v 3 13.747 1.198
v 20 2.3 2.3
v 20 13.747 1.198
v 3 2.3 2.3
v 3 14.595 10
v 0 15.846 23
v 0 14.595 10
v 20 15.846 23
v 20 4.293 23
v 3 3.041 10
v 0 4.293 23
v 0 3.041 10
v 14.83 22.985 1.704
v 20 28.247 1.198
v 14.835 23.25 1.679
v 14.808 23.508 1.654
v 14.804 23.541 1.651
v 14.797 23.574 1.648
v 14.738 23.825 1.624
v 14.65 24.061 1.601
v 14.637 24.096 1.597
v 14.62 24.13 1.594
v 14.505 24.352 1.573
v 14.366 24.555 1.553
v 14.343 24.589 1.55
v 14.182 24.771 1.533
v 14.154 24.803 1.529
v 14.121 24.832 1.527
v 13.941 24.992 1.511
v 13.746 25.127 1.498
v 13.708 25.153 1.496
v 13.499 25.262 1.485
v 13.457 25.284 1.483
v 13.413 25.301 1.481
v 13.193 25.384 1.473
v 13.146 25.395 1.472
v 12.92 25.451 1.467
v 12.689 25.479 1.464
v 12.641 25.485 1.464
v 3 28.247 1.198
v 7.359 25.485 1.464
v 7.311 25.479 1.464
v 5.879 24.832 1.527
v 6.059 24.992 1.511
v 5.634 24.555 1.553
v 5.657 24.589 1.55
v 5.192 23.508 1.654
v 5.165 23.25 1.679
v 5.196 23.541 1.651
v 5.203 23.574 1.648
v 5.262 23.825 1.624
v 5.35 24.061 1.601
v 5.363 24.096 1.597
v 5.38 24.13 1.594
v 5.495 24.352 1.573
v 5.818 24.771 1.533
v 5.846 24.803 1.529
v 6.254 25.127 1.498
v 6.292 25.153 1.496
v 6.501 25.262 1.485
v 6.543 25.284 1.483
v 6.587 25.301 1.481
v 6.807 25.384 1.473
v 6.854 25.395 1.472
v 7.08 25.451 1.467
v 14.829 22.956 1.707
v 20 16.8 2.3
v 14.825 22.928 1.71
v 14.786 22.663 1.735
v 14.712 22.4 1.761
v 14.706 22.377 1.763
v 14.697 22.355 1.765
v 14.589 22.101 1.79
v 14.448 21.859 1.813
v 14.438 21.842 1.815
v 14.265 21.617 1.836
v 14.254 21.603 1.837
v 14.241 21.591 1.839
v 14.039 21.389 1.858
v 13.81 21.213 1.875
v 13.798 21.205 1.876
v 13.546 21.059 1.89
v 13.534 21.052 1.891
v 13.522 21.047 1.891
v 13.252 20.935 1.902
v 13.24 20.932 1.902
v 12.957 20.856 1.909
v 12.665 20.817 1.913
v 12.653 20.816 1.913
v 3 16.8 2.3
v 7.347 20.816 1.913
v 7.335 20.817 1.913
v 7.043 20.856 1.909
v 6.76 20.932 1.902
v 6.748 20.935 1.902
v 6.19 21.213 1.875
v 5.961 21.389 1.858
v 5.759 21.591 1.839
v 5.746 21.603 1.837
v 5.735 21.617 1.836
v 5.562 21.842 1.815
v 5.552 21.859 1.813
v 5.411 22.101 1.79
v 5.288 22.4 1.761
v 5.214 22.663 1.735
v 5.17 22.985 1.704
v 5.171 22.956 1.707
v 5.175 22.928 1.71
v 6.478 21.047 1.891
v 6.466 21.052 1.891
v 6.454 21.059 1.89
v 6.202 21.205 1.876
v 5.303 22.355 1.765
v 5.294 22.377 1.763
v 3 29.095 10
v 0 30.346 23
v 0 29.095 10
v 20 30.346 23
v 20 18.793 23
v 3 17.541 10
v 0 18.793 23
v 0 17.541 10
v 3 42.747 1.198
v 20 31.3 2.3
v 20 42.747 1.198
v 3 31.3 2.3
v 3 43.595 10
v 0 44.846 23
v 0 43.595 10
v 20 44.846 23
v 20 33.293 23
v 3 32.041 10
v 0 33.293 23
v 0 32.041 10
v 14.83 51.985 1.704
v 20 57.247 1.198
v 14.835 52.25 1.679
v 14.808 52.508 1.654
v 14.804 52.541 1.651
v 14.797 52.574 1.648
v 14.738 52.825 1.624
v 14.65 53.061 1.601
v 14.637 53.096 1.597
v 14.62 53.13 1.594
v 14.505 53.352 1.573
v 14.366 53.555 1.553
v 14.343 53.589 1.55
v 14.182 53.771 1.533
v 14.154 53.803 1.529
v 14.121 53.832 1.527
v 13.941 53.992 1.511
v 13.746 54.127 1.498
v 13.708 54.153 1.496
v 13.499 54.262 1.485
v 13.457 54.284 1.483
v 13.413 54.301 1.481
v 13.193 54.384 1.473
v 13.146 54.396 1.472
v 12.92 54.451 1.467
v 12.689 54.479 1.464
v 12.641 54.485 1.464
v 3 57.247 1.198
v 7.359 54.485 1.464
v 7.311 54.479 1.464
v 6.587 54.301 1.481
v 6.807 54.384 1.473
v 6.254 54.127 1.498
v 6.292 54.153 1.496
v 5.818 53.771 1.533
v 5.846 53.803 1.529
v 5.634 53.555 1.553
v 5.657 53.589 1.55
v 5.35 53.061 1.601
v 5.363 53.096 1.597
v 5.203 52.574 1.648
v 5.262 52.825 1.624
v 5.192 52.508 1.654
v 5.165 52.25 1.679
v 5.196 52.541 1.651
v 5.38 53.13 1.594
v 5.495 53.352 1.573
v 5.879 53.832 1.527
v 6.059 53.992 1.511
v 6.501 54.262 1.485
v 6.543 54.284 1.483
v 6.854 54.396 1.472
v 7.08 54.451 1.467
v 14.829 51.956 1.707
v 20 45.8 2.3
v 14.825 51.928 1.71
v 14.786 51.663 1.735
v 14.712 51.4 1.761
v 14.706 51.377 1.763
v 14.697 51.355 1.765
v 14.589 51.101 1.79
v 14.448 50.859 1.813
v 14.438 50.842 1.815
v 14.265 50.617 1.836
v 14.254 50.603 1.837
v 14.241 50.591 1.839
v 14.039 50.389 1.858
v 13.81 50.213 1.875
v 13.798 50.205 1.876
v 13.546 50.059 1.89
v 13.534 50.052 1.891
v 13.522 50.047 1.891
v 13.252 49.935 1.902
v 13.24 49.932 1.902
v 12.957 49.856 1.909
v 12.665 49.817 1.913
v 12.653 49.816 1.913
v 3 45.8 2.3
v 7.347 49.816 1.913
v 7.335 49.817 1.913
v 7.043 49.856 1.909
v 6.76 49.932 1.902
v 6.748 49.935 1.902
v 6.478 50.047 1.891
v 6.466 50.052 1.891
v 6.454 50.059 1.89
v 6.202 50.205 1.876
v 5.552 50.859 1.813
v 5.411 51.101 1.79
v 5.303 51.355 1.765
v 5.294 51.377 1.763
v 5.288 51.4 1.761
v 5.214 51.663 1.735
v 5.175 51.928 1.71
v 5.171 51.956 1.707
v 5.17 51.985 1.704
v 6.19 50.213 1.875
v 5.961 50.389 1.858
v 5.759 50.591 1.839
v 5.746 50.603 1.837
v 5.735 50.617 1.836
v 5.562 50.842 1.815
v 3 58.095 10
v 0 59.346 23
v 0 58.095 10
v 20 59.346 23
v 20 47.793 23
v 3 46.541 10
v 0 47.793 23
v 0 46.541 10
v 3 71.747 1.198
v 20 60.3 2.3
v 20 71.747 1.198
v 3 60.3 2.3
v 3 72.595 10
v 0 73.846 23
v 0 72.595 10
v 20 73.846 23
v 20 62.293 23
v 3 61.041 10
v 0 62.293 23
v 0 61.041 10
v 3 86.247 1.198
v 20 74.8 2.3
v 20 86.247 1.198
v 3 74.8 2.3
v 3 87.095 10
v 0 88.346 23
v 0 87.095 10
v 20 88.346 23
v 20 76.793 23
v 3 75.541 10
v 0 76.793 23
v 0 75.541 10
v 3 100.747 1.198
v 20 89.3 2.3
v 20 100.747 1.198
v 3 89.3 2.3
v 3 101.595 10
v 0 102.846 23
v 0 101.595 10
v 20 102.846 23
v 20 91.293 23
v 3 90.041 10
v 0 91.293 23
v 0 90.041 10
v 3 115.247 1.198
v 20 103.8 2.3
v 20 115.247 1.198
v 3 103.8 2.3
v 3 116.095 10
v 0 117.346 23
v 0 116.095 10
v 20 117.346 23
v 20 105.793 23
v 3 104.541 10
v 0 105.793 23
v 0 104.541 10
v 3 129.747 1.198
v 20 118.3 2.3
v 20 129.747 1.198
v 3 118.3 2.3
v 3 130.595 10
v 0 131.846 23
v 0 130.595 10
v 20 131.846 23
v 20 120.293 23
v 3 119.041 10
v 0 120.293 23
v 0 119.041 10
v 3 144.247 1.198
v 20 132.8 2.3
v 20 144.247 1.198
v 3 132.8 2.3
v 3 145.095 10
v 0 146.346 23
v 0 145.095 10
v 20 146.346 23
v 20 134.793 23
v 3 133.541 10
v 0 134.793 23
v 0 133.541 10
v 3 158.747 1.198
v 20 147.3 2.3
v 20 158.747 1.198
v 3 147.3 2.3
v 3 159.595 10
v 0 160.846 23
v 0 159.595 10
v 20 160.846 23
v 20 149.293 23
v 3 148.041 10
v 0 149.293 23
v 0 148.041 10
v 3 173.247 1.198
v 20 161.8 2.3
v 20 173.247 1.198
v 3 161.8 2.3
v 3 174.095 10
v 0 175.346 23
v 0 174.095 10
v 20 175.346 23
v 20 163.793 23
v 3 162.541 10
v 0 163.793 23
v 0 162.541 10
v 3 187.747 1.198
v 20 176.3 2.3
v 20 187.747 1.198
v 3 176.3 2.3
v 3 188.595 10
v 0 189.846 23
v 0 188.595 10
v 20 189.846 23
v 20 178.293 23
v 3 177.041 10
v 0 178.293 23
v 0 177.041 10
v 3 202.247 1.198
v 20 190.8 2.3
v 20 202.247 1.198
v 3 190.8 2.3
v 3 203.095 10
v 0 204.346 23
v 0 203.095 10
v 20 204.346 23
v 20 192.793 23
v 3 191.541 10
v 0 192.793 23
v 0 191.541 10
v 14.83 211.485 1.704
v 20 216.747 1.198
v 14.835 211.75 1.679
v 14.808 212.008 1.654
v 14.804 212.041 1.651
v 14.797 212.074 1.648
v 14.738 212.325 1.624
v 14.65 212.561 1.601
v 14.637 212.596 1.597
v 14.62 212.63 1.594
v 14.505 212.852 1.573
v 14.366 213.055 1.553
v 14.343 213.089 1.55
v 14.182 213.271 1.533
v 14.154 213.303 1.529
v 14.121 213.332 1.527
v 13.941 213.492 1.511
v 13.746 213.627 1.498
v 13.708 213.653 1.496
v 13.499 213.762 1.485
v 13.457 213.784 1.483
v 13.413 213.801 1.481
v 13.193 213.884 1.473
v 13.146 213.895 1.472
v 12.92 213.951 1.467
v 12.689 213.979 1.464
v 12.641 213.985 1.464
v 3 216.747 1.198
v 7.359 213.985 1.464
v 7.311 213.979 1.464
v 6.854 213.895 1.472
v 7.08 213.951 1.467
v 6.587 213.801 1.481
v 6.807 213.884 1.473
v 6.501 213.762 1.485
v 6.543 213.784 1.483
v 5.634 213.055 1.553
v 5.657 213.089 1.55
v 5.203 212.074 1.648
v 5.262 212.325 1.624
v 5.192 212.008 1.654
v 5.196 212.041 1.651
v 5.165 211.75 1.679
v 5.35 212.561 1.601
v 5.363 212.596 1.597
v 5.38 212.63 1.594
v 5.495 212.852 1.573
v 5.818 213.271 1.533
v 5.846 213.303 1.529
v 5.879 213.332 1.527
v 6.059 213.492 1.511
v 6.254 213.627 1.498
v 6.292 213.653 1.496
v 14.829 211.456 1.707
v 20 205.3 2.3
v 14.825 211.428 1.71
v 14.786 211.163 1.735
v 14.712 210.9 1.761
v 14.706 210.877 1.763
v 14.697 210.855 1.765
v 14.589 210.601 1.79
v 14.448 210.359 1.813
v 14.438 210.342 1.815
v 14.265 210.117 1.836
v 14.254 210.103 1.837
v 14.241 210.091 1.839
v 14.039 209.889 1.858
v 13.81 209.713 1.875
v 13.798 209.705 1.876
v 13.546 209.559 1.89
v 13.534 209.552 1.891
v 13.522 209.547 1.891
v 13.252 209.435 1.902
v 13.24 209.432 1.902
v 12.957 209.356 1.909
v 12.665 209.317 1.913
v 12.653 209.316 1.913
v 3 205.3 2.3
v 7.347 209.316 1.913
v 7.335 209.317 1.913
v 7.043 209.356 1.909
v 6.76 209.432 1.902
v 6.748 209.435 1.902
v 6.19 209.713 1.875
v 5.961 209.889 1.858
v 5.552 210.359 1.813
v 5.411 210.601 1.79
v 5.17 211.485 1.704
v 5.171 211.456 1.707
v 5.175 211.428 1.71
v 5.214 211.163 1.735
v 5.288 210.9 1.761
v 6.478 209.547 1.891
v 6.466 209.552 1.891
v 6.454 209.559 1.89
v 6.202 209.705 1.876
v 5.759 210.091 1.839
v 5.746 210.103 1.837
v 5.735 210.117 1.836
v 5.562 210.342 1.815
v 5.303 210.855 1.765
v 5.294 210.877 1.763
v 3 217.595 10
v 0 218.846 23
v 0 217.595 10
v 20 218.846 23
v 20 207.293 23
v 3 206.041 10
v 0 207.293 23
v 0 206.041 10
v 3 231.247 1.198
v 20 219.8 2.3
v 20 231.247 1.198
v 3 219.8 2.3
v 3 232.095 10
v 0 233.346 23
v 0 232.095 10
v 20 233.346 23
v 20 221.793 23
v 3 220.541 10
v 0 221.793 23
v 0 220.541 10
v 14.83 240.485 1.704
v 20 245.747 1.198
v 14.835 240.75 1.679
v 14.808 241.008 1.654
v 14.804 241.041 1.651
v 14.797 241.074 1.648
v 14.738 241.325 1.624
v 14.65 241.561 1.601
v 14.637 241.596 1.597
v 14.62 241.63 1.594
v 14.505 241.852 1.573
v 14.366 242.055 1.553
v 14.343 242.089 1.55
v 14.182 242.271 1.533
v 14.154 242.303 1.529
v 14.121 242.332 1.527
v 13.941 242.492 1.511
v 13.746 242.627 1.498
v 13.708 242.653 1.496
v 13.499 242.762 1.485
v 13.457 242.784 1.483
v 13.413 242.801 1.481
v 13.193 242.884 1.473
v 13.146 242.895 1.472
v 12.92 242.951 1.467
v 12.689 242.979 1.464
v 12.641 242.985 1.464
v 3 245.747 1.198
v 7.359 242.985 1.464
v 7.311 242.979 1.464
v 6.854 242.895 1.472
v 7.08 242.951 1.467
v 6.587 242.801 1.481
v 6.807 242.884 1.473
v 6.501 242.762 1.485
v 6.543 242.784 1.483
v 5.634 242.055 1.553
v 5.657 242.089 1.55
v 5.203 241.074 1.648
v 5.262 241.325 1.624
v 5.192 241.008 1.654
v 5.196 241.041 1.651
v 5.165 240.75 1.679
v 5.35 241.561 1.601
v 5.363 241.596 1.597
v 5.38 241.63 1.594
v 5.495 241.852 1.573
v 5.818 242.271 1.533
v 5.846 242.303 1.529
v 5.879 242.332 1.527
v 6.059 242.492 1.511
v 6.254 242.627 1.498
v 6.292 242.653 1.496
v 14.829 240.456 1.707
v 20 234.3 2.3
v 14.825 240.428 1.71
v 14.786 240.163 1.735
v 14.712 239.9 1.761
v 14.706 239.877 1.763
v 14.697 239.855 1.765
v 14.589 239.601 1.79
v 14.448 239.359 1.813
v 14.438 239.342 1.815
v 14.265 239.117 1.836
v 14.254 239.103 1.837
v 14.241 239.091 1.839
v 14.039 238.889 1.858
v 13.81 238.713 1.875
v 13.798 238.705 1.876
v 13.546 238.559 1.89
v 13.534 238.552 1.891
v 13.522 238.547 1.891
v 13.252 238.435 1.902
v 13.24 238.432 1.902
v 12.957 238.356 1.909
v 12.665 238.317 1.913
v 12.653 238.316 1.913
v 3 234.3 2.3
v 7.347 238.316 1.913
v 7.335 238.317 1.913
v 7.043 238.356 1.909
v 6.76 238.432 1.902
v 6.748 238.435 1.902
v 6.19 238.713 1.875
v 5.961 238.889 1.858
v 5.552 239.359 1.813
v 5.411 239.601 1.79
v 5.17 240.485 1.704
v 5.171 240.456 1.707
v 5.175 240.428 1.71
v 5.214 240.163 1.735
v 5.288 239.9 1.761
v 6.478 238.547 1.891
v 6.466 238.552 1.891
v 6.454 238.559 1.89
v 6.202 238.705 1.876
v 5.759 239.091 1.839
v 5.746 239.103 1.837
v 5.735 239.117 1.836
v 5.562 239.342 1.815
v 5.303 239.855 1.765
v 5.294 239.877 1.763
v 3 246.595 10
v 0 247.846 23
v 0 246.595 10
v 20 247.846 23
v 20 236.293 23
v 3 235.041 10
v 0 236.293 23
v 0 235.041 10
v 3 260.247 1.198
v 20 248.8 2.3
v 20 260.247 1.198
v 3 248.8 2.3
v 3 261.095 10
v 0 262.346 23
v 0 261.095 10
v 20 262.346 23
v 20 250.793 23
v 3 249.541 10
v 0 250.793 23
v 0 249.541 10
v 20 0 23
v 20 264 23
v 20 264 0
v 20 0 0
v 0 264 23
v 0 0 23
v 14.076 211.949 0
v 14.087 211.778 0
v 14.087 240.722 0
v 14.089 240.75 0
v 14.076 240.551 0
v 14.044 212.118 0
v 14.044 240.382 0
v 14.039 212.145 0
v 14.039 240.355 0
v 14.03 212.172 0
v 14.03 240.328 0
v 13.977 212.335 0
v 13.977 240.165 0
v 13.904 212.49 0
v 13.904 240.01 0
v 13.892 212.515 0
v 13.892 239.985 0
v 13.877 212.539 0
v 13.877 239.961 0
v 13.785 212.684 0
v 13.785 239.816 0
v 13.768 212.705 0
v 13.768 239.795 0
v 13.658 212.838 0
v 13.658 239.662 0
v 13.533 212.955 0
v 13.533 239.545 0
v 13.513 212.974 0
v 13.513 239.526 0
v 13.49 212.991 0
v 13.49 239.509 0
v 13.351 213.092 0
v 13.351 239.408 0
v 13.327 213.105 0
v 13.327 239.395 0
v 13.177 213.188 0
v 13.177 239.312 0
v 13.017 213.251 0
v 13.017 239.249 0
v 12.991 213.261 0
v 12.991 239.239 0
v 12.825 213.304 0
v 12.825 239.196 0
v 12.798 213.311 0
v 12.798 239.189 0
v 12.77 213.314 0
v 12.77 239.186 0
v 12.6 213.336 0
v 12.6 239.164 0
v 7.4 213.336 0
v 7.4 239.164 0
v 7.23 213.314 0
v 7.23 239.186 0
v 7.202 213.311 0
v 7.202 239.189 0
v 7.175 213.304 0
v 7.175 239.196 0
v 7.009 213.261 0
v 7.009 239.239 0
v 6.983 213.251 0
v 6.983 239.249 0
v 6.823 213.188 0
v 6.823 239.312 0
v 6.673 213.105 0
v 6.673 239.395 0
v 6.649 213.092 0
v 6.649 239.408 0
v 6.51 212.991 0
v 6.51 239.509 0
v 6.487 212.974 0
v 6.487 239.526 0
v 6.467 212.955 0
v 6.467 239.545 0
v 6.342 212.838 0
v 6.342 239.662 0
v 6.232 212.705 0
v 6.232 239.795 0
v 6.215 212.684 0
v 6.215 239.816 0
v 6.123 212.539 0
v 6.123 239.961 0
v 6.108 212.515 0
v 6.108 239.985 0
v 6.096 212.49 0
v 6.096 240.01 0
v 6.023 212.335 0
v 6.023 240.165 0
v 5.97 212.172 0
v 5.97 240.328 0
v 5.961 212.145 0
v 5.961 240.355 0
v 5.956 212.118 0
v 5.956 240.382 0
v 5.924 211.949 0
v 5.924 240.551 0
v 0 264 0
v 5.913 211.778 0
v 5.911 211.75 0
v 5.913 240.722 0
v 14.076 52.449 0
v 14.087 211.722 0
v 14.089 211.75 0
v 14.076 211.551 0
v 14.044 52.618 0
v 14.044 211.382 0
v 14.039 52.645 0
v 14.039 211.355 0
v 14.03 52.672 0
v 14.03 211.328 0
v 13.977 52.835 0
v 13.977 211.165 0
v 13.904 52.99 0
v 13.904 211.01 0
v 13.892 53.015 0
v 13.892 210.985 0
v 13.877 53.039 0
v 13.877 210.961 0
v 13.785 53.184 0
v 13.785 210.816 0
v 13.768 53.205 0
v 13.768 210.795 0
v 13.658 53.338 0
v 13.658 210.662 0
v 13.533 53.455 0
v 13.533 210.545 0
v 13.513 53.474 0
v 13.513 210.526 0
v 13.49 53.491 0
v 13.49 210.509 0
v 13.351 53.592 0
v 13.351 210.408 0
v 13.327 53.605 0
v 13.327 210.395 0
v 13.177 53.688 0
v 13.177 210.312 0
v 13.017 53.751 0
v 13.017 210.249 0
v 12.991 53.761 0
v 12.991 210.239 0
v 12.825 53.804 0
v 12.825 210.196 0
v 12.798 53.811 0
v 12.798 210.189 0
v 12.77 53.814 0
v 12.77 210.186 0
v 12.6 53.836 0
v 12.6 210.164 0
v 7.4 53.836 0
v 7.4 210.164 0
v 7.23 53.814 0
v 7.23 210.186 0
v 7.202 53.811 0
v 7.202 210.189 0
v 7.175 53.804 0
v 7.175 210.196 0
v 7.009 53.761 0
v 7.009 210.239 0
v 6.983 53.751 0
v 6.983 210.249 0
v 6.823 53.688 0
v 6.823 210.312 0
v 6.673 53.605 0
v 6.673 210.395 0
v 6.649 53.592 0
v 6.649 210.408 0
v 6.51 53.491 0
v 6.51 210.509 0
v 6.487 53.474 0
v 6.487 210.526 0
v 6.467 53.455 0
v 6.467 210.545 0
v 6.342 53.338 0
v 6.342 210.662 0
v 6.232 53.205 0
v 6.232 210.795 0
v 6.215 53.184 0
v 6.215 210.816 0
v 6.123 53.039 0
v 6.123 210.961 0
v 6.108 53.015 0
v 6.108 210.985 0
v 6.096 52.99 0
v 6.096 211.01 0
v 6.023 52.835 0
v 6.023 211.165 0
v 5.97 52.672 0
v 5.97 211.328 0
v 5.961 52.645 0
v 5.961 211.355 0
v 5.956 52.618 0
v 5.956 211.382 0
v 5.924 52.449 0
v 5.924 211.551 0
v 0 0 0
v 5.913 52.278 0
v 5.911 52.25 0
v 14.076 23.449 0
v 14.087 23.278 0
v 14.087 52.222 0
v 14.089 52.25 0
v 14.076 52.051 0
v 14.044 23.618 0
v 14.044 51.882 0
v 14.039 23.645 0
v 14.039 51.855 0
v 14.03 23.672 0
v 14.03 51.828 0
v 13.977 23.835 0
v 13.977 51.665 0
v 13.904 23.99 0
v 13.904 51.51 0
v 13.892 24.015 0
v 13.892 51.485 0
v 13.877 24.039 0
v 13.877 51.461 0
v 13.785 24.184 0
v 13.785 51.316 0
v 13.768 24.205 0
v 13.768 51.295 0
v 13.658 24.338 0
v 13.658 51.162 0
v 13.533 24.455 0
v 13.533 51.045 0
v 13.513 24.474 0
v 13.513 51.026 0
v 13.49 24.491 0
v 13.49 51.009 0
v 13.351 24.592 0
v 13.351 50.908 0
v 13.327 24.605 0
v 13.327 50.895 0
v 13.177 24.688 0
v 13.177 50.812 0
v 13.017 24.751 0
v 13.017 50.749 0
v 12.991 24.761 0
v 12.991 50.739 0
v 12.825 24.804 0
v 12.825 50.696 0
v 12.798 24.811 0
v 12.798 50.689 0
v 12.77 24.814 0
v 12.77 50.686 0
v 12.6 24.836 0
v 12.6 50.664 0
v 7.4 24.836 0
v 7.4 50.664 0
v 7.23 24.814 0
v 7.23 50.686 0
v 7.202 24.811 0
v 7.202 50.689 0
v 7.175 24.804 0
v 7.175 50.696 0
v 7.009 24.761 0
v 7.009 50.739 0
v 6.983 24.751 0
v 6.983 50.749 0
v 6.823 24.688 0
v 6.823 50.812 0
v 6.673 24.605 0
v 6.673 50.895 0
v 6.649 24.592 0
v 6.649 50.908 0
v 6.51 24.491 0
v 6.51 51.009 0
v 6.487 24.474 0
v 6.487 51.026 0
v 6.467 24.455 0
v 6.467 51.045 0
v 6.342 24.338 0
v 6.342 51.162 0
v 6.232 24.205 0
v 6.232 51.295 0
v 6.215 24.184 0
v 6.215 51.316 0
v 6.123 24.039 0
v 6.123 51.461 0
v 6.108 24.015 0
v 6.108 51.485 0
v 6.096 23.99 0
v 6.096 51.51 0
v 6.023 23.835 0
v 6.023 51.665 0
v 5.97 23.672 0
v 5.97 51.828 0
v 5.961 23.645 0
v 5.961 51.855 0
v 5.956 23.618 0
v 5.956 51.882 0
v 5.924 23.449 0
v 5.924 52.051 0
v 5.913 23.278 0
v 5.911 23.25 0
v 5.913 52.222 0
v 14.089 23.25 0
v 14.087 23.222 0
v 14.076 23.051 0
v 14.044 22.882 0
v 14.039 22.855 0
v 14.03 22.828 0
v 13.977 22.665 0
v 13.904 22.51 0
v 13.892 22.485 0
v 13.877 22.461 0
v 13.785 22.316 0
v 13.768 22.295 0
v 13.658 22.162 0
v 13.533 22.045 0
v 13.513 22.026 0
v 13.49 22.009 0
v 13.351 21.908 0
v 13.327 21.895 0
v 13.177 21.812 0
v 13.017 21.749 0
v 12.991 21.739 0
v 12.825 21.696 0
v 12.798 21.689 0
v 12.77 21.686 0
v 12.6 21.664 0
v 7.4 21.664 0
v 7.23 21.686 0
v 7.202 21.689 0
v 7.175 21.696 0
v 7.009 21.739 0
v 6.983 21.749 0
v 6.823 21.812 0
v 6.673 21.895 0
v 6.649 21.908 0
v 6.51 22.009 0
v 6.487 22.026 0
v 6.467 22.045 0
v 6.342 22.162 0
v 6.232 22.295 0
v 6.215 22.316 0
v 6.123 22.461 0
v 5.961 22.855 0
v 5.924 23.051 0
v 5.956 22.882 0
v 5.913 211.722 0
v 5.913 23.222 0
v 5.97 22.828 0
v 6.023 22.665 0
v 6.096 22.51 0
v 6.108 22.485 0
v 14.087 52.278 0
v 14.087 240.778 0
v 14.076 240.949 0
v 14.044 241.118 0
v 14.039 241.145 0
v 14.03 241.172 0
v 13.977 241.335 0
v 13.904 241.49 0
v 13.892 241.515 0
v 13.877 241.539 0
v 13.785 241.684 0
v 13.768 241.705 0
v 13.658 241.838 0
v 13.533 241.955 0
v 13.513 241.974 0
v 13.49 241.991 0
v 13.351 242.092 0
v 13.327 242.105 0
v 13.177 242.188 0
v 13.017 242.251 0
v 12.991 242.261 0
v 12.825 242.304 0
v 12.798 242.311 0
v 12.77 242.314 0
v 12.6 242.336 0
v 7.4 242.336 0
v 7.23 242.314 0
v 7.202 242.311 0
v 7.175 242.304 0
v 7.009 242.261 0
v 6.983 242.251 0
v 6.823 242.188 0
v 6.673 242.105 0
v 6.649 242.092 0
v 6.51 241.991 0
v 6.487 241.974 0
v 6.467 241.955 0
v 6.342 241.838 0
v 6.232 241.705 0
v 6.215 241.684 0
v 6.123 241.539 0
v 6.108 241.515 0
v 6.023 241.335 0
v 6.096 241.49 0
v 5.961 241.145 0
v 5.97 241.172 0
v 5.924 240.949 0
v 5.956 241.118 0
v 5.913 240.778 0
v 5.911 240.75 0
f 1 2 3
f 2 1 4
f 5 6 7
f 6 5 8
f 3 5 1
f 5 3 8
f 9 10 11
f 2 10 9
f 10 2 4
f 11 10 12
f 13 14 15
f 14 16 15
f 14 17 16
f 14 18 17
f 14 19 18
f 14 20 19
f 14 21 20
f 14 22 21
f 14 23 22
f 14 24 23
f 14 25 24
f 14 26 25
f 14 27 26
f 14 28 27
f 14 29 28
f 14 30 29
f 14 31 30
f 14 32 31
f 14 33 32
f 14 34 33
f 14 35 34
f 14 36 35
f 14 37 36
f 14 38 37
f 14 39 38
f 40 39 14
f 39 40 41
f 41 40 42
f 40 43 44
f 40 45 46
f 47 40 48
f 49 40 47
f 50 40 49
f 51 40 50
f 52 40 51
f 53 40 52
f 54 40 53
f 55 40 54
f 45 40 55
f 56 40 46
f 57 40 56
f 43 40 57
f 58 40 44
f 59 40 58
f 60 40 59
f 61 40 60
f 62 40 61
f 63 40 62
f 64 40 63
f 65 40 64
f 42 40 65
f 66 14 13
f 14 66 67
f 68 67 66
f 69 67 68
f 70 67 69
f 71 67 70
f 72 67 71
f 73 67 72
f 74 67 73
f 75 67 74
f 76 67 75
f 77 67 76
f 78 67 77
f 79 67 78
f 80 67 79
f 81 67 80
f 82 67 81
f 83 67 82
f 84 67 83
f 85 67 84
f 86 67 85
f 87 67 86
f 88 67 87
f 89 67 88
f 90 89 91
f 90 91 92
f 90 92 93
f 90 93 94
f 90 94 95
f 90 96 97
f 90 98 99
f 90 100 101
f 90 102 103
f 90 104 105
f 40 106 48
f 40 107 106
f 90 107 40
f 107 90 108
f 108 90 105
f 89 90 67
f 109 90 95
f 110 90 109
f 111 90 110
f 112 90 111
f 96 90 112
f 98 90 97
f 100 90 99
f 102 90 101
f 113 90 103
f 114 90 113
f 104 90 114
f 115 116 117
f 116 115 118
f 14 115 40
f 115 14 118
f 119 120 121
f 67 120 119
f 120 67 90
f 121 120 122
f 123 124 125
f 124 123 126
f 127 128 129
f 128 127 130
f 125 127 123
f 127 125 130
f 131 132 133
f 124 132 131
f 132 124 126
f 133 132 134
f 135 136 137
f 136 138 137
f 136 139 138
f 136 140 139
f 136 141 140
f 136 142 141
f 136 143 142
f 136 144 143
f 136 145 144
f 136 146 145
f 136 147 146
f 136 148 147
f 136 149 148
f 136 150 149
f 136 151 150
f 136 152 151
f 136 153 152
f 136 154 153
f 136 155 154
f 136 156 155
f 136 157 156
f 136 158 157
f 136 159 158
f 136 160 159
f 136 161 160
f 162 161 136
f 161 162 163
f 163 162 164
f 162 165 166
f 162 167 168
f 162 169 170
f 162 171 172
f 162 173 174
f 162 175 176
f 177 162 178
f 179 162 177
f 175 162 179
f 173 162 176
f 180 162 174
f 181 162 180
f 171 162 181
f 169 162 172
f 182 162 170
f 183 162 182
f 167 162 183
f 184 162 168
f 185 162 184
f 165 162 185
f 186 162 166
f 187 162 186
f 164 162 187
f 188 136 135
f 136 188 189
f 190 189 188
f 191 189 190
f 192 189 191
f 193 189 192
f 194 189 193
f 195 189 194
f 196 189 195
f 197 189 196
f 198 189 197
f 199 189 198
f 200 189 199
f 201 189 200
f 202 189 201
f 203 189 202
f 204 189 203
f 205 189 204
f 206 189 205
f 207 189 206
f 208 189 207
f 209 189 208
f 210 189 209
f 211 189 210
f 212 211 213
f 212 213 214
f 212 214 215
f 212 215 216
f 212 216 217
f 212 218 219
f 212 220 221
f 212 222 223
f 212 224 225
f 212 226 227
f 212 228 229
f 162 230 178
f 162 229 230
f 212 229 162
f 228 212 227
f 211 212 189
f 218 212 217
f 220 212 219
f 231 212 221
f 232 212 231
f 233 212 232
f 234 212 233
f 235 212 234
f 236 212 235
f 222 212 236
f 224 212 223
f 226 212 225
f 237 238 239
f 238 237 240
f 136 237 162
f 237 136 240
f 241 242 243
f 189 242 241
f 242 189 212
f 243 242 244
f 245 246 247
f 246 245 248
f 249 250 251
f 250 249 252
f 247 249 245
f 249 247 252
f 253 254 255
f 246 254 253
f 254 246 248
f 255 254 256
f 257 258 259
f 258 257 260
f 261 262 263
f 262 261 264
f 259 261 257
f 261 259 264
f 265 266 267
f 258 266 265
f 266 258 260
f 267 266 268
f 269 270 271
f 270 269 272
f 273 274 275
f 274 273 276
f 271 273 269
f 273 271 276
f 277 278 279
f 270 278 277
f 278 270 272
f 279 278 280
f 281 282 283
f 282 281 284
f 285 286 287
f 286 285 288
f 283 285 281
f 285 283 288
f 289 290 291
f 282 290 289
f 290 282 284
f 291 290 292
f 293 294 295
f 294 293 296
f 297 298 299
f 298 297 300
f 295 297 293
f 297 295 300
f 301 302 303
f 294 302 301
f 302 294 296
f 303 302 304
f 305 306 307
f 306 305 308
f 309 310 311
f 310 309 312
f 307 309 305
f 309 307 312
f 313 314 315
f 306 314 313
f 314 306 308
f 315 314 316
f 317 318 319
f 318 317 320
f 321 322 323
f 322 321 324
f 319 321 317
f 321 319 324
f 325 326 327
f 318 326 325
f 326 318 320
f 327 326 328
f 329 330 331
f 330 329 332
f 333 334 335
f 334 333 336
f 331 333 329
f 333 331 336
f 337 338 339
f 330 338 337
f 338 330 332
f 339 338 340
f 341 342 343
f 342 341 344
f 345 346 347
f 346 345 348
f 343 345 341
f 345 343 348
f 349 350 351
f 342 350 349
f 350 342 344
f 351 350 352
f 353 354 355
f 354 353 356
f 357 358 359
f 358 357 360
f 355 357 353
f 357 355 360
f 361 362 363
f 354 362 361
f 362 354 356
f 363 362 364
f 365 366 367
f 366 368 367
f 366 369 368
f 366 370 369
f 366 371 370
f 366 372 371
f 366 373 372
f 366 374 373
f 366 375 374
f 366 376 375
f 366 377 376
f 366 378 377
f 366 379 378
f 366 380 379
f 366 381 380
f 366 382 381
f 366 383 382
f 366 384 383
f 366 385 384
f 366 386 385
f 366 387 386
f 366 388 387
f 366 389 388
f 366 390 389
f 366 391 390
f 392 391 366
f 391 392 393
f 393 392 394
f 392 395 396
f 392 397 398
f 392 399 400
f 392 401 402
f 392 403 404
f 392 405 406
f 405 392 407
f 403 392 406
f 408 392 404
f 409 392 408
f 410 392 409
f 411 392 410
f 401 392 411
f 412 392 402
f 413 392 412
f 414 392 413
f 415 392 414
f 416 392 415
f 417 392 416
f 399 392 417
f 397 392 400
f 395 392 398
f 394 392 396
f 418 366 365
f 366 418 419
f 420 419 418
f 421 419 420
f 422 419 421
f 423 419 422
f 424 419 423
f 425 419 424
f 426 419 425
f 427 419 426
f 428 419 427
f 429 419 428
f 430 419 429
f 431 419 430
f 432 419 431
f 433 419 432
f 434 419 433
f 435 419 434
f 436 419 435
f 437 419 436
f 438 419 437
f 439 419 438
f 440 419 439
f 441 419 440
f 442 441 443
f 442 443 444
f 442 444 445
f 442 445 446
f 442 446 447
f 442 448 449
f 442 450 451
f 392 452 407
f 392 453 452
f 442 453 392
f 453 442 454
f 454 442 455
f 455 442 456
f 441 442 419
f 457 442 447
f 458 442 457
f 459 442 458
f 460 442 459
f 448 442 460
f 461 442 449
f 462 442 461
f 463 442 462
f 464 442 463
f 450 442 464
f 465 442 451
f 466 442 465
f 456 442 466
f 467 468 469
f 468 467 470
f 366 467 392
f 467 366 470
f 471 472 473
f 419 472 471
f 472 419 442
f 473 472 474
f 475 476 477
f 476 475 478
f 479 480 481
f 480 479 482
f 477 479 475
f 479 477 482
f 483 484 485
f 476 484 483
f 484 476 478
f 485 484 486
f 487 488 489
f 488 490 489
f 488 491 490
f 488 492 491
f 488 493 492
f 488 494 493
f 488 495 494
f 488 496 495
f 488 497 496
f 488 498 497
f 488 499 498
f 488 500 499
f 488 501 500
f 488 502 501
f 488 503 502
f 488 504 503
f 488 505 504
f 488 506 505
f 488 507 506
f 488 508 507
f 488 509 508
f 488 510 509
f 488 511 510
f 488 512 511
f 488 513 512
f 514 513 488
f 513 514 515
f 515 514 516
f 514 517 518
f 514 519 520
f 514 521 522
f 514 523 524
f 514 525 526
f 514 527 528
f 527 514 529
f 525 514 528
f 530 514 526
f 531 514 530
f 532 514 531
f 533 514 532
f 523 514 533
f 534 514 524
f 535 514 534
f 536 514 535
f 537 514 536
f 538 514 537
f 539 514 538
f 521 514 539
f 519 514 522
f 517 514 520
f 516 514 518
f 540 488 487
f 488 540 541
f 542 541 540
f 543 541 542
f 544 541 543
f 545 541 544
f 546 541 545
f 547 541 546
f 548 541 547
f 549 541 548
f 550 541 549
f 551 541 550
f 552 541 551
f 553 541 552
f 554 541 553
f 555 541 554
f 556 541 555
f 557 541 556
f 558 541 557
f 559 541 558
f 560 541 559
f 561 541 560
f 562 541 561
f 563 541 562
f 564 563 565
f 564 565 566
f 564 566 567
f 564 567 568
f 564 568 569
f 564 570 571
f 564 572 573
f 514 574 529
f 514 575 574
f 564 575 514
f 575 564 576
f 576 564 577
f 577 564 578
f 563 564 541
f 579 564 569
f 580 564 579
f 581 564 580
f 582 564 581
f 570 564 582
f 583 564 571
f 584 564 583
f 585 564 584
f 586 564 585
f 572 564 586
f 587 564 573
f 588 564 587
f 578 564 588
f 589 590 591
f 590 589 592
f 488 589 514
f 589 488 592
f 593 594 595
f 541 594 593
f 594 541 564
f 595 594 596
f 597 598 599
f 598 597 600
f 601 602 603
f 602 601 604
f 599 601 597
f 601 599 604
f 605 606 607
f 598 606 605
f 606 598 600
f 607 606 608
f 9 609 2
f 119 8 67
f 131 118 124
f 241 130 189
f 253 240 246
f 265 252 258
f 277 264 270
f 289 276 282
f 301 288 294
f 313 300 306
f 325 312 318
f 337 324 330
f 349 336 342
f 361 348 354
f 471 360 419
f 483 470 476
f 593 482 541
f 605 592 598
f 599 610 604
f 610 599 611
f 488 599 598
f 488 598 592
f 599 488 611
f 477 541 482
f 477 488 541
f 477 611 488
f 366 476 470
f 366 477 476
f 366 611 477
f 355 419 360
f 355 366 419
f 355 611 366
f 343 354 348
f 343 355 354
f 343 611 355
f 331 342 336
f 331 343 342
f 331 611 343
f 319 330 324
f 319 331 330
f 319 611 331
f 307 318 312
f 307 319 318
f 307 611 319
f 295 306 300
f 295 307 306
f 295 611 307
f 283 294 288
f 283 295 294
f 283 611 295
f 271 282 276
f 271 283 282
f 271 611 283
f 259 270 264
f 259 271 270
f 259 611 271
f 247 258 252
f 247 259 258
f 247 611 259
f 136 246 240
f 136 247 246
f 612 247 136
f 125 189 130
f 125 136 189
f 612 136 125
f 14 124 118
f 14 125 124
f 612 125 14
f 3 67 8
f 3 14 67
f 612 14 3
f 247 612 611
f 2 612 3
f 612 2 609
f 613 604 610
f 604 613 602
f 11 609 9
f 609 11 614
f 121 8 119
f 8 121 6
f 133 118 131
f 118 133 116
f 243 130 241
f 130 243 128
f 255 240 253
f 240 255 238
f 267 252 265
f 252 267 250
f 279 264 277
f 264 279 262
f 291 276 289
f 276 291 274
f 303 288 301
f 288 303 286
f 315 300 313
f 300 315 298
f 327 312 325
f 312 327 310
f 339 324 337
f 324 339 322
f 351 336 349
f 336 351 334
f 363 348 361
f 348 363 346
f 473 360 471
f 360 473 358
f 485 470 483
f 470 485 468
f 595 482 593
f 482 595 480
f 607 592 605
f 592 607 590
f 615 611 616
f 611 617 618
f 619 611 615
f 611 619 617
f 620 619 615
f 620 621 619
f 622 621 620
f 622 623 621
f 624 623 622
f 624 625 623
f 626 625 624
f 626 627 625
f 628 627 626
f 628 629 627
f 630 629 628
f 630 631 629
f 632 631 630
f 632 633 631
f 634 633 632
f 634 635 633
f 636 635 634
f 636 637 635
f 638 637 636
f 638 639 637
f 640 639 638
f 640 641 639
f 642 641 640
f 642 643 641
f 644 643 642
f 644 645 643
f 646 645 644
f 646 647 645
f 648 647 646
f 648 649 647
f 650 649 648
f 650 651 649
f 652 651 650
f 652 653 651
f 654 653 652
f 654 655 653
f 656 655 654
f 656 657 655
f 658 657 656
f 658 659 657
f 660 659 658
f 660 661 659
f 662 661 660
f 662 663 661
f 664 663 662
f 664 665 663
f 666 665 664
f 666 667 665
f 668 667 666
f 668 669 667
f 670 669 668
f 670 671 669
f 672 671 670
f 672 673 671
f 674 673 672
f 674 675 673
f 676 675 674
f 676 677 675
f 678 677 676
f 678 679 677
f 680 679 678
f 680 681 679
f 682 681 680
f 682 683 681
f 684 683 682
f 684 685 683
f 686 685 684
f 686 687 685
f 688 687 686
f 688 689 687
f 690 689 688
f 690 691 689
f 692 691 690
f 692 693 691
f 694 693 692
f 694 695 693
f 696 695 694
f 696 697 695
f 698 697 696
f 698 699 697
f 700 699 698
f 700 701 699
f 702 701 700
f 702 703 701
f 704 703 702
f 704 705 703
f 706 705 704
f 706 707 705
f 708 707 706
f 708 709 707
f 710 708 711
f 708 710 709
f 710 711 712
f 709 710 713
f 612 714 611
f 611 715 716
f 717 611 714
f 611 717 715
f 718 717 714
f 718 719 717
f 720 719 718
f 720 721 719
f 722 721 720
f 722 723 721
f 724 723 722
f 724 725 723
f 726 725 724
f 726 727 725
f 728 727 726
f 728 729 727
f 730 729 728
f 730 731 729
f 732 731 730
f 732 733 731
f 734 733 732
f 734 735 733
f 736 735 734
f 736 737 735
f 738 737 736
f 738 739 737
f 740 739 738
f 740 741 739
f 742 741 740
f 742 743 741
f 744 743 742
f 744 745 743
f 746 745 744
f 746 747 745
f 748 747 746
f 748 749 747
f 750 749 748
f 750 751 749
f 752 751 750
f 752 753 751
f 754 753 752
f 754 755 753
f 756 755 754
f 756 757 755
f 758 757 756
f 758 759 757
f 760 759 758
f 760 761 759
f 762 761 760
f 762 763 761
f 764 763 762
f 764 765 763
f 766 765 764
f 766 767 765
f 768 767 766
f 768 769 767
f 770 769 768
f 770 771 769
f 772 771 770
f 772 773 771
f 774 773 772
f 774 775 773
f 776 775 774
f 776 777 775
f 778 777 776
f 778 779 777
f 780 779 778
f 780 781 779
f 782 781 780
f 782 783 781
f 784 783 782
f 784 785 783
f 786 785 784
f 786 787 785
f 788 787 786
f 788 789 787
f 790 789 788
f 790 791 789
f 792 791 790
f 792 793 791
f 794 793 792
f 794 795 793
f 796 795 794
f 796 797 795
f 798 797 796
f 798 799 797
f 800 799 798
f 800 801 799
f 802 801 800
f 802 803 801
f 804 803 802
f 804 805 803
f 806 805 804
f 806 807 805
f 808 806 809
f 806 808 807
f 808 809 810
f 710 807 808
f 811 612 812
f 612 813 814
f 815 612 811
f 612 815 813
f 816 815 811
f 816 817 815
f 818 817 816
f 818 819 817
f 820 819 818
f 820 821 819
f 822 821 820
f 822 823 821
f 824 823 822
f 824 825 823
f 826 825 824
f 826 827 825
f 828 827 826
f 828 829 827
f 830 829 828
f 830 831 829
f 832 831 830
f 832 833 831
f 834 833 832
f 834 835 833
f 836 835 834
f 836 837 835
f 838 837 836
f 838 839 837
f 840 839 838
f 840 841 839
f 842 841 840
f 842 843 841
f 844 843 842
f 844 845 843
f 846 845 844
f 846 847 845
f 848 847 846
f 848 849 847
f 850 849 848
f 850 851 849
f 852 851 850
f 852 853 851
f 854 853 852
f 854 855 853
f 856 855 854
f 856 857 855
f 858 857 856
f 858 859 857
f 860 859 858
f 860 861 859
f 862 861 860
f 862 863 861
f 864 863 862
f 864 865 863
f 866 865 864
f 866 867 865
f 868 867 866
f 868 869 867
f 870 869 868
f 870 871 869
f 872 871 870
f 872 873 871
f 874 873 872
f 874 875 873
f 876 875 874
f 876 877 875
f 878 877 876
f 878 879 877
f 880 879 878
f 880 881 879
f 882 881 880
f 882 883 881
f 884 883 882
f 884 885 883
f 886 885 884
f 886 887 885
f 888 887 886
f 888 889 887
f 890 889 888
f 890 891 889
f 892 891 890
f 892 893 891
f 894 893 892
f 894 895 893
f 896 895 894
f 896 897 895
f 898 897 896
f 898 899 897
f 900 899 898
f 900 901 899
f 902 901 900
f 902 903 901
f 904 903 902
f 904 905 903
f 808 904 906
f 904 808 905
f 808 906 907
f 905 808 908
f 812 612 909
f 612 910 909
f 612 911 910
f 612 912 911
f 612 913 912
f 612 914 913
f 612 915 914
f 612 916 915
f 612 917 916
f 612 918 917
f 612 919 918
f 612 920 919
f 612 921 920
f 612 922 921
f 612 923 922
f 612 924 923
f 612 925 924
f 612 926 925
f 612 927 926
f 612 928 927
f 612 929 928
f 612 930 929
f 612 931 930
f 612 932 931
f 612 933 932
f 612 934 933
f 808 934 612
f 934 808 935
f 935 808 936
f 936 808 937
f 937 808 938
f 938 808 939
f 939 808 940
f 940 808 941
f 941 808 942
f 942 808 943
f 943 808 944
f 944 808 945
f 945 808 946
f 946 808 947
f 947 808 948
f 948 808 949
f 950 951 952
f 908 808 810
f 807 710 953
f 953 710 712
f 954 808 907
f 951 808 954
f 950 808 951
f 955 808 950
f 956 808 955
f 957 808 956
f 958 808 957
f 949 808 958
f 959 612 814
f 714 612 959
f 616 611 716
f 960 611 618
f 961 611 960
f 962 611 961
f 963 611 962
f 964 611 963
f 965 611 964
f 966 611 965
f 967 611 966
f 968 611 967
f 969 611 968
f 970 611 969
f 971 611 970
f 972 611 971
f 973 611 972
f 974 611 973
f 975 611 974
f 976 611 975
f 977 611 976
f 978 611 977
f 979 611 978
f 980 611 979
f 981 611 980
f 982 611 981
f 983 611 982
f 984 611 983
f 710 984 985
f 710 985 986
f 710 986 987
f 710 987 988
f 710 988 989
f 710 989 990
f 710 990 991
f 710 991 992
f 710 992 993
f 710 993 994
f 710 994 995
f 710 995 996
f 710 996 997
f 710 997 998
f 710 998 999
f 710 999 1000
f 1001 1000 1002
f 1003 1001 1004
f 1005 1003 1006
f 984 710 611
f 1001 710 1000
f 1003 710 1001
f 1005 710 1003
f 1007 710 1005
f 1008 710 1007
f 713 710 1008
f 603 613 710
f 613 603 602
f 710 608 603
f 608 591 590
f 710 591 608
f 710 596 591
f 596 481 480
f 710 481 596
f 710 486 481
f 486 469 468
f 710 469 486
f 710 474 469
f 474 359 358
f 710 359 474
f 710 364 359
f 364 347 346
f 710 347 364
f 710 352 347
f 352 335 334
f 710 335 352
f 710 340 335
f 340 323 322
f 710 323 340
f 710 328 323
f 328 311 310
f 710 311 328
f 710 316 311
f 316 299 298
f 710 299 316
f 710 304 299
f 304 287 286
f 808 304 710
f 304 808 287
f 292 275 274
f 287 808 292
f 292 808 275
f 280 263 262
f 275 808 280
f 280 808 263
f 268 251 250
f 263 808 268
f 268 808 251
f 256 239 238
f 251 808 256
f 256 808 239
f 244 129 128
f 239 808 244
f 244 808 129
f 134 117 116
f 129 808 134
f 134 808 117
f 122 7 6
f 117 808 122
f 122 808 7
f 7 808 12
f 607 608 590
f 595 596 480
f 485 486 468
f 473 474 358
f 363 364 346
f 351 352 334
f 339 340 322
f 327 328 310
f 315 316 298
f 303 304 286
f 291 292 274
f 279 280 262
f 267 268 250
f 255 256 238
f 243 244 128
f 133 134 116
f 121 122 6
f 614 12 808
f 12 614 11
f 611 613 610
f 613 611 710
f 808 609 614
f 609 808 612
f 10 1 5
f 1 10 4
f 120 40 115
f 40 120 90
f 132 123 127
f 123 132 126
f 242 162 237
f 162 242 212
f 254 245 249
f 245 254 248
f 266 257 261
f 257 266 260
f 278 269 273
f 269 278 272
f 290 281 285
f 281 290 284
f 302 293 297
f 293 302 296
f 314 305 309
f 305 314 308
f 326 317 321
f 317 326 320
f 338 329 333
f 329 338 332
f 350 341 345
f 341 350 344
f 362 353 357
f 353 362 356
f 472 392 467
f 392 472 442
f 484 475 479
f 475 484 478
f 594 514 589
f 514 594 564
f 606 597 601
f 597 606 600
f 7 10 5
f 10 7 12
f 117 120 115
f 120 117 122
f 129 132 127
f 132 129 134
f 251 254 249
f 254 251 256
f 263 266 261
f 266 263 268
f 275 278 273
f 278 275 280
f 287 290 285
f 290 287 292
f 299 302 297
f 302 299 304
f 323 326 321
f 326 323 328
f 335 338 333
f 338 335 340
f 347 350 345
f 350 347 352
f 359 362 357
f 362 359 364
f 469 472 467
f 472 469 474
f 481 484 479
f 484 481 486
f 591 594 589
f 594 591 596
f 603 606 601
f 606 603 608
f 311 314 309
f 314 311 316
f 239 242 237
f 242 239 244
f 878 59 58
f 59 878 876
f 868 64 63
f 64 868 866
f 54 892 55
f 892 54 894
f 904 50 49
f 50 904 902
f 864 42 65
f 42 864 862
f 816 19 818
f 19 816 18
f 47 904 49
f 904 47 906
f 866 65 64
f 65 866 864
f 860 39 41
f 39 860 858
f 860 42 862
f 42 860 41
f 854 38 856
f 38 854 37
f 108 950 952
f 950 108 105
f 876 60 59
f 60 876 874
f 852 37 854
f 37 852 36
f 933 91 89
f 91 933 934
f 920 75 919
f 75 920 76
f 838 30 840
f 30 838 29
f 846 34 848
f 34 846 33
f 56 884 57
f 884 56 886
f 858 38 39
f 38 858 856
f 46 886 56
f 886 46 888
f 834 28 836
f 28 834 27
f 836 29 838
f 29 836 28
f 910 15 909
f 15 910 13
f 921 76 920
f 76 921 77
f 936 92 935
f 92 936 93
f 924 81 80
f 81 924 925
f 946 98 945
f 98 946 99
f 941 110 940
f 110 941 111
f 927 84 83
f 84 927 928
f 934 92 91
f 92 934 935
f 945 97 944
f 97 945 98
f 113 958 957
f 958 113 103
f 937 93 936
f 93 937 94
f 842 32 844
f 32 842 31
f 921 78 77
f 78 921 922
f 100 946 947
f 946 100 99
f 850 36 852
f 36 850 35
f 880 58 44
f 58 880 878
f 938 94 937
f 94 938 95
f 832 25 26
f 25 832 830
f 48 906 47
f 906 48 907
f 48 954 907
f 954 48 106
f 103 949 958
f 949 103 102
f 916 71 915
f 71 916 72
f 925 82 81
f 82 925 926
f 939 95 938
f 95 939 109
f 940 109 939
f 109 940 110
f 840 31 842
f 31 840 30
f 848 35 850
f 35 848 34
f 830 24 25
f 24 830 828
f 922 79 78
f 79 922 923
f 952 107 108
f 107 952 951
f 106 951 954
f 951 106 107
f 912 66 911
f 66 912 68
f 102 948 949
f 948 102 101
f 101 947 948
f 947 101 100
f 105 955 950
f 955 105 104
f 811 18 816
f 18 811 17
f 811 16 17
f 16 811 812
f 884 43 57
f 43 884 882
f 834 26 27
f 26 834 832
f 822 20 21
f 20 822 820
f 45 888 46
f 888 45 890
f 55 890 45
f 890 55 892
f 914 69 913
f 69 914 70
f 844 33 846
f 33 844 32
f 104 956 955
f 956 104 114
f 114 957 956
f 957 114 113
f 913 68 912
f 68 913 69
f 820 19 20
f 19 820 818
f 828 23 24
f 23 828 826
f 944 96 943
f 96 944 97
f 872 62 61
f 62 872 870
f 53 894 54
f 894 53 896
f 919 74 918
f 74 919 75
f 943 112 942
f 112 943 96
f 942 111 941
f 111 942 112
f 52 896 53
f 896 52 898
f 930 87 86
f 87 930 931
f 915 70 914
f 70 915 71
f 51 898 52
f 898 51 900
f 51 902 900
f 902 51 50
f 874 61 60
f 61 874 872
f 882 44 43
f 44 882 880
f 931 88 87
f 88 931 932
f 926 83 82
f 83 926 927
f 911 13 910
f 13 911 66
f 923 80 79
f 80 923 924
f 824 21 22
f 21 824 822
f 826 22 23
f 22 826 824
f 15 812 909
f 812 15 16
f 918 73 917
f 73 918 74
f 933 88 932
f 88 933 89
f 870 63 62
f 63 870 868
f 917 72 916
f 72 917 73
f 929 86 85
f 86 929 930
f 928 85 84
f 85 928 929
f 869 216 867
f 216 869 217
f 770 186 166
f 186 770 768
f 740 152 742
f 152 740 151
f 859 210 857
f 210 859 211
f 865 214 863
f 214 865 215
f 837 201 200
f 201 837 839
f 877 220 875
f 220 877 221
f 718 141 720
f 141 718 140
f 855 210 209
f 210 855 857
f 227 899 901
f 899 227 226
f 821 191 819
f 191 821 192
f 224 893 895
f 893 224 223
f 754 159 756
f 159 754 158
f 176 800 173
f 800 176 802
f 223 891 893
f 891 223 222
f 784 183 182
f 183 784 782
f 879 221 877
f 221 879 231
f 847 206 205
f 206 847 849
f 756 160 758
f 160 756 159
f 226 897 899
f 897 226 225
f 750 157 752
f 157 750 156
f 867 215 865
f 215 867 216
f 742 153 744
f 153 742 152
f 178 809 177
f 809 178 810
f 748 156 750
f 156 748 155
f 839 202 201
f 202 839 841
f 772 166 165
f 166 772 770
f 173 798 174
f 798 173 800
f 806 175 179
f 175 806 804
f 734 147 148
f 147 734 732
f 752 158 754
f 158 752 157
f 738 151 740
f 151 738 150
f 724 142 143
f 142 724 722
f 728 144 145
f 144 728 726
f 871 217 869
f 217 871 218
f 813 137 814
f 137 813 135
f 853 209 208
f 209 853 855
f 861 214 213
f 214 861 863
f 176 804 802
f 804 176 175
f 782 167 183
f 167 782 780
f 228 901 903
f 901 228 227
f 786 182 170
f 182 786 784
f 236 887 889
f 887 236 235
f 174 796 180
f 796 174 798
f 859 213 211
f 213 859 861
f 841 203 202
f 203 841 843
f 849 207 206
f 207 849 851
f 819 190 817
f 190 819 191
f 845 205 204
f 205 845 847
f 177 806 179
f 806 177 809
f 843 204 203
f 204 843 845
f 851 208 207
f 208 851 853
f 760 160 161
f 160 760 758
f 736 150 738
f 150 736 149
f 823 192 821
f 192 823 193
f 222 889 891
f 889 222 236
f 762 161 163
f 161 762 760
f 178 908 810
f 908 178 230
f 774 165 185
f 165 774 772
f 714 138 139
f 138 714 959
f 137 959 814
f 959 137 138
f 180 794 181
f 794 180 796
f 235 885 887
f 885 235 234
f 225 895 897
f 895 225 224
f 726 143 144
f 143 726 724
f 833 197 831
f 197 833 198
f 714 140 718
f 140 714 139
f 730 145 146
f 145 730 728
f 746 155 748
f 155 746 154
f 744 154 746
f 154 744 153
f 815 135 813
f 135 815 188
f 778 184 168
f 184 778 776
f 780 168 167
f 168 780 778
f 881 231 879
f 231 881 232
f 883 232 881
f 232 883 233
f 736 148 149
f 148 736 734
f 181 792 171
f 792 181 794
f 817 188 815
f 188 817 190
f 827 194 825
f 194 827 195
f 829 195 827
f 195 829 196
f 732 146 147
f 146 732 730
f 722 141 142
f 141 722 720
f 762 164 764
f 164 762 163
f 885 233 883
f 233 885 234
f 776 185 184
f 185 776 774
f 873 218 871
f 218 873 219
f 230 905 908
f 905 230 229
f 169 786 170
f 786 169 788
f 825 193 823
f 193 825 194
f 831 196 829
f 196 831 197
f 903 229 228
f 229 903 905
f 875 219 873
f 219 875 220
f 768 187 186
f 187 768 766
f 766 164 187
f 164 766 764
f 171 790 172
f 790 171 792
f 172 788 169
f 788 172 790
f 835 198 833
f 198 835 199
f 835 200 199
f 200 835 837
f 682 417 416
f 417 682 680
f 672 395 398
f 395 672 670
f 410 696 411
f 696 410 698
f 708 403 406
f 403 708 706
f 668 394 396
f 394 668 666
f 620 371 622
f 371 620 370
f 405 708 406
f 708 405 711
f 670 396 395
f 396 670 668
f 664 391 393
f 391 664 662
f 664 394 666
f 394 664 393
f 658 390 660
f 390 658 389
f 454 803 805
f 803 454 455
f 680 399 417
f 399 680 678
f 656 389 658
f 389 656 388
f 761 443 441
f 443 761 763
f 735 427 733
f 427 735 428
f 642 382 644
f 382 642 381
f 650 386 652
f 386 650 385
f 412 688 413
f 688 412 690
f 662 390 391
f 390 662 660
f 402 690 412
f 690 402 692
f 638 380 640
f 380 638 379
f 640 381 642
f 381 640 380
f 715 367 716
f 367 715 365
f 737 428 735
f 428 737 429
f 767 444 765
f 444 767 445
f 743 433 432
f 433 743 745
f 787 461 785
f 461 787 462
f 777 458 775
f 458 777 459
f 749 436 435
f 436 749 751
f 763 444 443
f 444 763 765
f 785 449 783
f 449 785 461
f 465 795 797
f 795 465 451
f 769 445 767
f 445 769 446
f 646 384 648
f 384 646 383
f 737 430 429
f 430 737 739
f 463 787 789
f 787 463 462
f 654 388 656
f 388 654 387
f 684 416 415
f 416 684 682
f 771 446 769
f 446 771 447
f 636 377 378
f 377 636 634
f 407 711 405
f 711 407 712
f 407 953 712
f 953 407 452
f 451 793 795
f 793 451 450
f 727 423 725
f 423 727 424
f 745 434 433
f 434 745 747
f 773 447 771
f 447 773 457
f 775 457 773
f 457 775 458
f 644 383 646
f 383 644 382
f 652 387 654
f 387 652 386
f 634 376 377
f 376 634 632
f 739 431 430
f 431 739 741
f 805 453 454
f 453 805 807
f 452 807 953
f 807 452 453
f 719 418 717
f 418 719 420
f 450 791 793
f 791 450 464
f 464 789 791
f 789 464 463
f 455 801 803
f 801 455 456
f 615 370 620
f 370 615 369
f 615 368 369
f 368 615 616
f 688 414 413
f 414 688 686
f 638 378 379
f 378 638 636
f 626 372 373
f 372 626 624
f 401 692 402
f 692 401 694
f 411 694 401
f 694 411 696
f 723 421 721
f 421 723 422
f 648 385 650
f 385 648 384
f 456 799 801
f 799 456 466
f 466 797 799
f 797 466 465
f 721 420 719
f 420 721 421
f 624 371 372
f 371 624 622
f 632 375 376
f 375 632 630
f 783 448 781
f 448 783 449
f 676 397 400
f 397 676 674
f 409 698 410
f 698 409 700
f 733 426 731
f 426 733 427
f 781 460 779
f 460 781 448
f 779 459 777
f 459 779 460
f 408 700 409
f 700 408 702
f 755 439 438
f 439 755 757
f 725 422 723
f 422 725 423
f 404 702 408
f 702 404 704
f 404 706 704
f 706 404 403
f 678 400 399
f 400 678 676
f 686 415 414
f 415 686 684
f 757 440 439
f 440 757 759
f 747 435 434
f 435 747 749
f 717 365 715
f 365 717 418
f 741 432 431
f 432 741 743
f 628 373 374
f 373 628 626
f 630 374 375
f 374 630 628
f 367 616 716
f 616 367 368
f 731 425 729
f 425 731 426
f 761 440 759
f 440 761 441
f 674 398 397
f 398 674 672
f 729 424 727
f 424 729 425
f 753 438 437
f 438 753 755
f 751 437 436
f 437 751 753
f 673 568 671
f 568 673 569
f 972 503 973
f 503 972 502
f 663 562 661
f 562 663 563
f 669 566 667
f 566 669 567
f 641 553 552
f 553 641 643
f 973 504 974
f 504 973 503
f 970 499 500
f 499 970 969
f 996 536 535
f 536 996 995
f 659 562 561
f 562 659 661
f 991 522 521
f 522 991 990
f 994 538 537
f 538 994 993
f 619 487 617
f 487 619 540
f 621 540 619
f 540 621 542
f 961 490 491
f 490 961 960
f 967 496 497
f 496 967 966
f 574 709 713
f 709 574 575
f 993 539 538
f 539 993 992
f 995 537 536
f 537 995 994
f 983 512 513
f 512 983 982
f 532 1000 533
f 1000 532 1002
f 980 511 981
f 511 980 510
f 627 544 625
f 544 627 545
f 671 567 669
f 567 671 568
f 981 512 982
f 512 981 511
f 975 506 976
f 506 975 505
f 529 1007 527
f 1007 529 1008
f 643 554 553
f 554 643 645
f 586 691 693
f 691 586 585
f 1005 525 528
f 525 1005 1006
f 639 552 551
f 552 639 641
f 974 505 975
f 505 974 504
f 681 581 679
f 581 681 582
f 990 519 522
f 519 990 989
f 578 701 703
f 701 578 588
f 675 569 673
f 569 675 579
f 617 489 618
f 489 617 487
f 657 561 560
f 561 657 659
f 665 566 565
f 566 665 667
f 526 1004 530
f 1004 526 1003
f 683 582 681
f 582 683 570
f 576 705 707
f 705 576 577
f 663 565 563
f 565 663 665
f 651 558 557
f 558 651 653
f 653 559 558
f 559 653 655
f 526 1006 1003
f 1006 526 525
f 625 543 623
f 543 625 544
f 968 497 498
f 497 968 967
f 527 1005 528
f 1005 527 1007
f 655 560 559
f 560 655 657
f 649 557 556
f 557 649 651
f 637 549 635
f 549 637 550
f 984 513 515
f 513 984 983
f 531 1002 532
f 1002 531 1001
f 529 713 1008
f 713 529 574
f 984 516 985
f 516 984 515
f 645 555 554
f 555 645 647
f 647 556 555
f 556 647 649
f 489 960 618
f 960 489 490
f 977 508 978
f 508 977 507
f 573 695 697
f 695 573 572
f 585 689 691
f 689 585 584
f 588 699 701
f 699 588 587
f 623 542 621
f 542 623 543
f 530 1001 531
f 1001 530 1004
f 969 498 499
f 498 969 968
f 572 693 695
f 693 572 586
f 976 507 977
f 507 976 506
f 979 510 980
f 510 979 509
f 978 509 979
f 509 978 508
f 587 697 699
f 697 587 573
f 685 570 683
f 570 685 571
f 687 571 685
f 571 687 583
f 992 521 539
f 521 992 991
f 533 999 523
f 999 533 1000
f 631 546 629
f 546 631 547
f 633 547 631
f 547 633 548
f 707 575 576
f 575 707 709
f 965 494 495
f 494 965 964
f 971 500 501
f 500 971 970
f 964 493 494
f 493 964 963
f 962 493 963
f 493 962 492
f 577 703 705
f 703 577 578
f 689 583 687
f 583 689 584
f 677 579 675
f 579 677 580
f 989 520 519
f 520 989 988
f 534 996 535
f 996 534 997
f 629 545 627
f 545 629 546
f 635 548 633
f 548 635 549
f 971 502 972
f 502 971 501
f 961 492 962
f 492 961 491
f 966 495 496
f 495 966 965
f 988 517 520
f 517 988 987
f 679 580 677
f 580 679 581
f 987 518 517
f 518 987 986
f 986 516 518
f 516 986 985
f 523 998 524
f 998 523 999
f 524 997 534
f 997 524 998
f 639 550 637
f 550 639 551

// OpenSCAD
// -1 for the left side, 1 for the right, 0 for the middle
piece_side = -1;

// 18 is the limit for my table
cd_count = 18;
rail_thick = 3;
rail_height = 10;
cd_thick = 11.5;

width = 20;
length = (cd_thick + rail_thick)*cd_count + rail_thick;
height = 23;
bot_ofs = 2.3;
// 2.6, 4.6, 21 -> sin(a) = 2/21 a = 5.5 degree
angle = 5.5;
ofs = 0.2;

screw_hole_indices = [1, 3, 14, 16];
screw_d = 3;
screw_head_d = 5;
screw_gap_len = 5;
$fn = 50;

echo("Total length = ", length);

module base() { 
    cube([width, length, height]);
}


module disk() {
    translate([0, bot_ofs, bot_ofs])
    rotate([-angle, 0, 0])
    translate([-ofs, 0, 0])
        cube([width + ofs*2, cd_thick, height]);
}

module screw_hole(idx) {
    translate([width/2, rail_thick + cd_thick/2 + idx*(rail_thick + cd_thick), -ofs]) {
        cylinder(h = height, r = screw_d/2);

        translate([0, 0, rail_thick/4])
        cylinder(rail_thick/2, screw_d/2, screw_head_d/2);        
    }
}

module screw_gap(idx) {
    hull() {
        translate([-screw_gap_len/2, 0, 0])
            screw_hole(idx);
        translate([screw_gap_len/2, 0, 0])
            screw_hole(idx);
    }
}


module base_with_cds() {
    difference() {
        base();
        
        union() {
            for (i = [0:cd_count-1])
                translate([0, i*(cd_thick + rail_thick), 0])
                    disk();
        }
    }
}



difference() {
    union() {
        base_with_cds();
        translate([(width/2 - rail_thick/2)*(piece_side + 1), 0, 0])
            cube([rail_thick, length, rail_height]);
    }
        
    for (idx = screw_hole_indices) 
        screw_gap(idx);
}
